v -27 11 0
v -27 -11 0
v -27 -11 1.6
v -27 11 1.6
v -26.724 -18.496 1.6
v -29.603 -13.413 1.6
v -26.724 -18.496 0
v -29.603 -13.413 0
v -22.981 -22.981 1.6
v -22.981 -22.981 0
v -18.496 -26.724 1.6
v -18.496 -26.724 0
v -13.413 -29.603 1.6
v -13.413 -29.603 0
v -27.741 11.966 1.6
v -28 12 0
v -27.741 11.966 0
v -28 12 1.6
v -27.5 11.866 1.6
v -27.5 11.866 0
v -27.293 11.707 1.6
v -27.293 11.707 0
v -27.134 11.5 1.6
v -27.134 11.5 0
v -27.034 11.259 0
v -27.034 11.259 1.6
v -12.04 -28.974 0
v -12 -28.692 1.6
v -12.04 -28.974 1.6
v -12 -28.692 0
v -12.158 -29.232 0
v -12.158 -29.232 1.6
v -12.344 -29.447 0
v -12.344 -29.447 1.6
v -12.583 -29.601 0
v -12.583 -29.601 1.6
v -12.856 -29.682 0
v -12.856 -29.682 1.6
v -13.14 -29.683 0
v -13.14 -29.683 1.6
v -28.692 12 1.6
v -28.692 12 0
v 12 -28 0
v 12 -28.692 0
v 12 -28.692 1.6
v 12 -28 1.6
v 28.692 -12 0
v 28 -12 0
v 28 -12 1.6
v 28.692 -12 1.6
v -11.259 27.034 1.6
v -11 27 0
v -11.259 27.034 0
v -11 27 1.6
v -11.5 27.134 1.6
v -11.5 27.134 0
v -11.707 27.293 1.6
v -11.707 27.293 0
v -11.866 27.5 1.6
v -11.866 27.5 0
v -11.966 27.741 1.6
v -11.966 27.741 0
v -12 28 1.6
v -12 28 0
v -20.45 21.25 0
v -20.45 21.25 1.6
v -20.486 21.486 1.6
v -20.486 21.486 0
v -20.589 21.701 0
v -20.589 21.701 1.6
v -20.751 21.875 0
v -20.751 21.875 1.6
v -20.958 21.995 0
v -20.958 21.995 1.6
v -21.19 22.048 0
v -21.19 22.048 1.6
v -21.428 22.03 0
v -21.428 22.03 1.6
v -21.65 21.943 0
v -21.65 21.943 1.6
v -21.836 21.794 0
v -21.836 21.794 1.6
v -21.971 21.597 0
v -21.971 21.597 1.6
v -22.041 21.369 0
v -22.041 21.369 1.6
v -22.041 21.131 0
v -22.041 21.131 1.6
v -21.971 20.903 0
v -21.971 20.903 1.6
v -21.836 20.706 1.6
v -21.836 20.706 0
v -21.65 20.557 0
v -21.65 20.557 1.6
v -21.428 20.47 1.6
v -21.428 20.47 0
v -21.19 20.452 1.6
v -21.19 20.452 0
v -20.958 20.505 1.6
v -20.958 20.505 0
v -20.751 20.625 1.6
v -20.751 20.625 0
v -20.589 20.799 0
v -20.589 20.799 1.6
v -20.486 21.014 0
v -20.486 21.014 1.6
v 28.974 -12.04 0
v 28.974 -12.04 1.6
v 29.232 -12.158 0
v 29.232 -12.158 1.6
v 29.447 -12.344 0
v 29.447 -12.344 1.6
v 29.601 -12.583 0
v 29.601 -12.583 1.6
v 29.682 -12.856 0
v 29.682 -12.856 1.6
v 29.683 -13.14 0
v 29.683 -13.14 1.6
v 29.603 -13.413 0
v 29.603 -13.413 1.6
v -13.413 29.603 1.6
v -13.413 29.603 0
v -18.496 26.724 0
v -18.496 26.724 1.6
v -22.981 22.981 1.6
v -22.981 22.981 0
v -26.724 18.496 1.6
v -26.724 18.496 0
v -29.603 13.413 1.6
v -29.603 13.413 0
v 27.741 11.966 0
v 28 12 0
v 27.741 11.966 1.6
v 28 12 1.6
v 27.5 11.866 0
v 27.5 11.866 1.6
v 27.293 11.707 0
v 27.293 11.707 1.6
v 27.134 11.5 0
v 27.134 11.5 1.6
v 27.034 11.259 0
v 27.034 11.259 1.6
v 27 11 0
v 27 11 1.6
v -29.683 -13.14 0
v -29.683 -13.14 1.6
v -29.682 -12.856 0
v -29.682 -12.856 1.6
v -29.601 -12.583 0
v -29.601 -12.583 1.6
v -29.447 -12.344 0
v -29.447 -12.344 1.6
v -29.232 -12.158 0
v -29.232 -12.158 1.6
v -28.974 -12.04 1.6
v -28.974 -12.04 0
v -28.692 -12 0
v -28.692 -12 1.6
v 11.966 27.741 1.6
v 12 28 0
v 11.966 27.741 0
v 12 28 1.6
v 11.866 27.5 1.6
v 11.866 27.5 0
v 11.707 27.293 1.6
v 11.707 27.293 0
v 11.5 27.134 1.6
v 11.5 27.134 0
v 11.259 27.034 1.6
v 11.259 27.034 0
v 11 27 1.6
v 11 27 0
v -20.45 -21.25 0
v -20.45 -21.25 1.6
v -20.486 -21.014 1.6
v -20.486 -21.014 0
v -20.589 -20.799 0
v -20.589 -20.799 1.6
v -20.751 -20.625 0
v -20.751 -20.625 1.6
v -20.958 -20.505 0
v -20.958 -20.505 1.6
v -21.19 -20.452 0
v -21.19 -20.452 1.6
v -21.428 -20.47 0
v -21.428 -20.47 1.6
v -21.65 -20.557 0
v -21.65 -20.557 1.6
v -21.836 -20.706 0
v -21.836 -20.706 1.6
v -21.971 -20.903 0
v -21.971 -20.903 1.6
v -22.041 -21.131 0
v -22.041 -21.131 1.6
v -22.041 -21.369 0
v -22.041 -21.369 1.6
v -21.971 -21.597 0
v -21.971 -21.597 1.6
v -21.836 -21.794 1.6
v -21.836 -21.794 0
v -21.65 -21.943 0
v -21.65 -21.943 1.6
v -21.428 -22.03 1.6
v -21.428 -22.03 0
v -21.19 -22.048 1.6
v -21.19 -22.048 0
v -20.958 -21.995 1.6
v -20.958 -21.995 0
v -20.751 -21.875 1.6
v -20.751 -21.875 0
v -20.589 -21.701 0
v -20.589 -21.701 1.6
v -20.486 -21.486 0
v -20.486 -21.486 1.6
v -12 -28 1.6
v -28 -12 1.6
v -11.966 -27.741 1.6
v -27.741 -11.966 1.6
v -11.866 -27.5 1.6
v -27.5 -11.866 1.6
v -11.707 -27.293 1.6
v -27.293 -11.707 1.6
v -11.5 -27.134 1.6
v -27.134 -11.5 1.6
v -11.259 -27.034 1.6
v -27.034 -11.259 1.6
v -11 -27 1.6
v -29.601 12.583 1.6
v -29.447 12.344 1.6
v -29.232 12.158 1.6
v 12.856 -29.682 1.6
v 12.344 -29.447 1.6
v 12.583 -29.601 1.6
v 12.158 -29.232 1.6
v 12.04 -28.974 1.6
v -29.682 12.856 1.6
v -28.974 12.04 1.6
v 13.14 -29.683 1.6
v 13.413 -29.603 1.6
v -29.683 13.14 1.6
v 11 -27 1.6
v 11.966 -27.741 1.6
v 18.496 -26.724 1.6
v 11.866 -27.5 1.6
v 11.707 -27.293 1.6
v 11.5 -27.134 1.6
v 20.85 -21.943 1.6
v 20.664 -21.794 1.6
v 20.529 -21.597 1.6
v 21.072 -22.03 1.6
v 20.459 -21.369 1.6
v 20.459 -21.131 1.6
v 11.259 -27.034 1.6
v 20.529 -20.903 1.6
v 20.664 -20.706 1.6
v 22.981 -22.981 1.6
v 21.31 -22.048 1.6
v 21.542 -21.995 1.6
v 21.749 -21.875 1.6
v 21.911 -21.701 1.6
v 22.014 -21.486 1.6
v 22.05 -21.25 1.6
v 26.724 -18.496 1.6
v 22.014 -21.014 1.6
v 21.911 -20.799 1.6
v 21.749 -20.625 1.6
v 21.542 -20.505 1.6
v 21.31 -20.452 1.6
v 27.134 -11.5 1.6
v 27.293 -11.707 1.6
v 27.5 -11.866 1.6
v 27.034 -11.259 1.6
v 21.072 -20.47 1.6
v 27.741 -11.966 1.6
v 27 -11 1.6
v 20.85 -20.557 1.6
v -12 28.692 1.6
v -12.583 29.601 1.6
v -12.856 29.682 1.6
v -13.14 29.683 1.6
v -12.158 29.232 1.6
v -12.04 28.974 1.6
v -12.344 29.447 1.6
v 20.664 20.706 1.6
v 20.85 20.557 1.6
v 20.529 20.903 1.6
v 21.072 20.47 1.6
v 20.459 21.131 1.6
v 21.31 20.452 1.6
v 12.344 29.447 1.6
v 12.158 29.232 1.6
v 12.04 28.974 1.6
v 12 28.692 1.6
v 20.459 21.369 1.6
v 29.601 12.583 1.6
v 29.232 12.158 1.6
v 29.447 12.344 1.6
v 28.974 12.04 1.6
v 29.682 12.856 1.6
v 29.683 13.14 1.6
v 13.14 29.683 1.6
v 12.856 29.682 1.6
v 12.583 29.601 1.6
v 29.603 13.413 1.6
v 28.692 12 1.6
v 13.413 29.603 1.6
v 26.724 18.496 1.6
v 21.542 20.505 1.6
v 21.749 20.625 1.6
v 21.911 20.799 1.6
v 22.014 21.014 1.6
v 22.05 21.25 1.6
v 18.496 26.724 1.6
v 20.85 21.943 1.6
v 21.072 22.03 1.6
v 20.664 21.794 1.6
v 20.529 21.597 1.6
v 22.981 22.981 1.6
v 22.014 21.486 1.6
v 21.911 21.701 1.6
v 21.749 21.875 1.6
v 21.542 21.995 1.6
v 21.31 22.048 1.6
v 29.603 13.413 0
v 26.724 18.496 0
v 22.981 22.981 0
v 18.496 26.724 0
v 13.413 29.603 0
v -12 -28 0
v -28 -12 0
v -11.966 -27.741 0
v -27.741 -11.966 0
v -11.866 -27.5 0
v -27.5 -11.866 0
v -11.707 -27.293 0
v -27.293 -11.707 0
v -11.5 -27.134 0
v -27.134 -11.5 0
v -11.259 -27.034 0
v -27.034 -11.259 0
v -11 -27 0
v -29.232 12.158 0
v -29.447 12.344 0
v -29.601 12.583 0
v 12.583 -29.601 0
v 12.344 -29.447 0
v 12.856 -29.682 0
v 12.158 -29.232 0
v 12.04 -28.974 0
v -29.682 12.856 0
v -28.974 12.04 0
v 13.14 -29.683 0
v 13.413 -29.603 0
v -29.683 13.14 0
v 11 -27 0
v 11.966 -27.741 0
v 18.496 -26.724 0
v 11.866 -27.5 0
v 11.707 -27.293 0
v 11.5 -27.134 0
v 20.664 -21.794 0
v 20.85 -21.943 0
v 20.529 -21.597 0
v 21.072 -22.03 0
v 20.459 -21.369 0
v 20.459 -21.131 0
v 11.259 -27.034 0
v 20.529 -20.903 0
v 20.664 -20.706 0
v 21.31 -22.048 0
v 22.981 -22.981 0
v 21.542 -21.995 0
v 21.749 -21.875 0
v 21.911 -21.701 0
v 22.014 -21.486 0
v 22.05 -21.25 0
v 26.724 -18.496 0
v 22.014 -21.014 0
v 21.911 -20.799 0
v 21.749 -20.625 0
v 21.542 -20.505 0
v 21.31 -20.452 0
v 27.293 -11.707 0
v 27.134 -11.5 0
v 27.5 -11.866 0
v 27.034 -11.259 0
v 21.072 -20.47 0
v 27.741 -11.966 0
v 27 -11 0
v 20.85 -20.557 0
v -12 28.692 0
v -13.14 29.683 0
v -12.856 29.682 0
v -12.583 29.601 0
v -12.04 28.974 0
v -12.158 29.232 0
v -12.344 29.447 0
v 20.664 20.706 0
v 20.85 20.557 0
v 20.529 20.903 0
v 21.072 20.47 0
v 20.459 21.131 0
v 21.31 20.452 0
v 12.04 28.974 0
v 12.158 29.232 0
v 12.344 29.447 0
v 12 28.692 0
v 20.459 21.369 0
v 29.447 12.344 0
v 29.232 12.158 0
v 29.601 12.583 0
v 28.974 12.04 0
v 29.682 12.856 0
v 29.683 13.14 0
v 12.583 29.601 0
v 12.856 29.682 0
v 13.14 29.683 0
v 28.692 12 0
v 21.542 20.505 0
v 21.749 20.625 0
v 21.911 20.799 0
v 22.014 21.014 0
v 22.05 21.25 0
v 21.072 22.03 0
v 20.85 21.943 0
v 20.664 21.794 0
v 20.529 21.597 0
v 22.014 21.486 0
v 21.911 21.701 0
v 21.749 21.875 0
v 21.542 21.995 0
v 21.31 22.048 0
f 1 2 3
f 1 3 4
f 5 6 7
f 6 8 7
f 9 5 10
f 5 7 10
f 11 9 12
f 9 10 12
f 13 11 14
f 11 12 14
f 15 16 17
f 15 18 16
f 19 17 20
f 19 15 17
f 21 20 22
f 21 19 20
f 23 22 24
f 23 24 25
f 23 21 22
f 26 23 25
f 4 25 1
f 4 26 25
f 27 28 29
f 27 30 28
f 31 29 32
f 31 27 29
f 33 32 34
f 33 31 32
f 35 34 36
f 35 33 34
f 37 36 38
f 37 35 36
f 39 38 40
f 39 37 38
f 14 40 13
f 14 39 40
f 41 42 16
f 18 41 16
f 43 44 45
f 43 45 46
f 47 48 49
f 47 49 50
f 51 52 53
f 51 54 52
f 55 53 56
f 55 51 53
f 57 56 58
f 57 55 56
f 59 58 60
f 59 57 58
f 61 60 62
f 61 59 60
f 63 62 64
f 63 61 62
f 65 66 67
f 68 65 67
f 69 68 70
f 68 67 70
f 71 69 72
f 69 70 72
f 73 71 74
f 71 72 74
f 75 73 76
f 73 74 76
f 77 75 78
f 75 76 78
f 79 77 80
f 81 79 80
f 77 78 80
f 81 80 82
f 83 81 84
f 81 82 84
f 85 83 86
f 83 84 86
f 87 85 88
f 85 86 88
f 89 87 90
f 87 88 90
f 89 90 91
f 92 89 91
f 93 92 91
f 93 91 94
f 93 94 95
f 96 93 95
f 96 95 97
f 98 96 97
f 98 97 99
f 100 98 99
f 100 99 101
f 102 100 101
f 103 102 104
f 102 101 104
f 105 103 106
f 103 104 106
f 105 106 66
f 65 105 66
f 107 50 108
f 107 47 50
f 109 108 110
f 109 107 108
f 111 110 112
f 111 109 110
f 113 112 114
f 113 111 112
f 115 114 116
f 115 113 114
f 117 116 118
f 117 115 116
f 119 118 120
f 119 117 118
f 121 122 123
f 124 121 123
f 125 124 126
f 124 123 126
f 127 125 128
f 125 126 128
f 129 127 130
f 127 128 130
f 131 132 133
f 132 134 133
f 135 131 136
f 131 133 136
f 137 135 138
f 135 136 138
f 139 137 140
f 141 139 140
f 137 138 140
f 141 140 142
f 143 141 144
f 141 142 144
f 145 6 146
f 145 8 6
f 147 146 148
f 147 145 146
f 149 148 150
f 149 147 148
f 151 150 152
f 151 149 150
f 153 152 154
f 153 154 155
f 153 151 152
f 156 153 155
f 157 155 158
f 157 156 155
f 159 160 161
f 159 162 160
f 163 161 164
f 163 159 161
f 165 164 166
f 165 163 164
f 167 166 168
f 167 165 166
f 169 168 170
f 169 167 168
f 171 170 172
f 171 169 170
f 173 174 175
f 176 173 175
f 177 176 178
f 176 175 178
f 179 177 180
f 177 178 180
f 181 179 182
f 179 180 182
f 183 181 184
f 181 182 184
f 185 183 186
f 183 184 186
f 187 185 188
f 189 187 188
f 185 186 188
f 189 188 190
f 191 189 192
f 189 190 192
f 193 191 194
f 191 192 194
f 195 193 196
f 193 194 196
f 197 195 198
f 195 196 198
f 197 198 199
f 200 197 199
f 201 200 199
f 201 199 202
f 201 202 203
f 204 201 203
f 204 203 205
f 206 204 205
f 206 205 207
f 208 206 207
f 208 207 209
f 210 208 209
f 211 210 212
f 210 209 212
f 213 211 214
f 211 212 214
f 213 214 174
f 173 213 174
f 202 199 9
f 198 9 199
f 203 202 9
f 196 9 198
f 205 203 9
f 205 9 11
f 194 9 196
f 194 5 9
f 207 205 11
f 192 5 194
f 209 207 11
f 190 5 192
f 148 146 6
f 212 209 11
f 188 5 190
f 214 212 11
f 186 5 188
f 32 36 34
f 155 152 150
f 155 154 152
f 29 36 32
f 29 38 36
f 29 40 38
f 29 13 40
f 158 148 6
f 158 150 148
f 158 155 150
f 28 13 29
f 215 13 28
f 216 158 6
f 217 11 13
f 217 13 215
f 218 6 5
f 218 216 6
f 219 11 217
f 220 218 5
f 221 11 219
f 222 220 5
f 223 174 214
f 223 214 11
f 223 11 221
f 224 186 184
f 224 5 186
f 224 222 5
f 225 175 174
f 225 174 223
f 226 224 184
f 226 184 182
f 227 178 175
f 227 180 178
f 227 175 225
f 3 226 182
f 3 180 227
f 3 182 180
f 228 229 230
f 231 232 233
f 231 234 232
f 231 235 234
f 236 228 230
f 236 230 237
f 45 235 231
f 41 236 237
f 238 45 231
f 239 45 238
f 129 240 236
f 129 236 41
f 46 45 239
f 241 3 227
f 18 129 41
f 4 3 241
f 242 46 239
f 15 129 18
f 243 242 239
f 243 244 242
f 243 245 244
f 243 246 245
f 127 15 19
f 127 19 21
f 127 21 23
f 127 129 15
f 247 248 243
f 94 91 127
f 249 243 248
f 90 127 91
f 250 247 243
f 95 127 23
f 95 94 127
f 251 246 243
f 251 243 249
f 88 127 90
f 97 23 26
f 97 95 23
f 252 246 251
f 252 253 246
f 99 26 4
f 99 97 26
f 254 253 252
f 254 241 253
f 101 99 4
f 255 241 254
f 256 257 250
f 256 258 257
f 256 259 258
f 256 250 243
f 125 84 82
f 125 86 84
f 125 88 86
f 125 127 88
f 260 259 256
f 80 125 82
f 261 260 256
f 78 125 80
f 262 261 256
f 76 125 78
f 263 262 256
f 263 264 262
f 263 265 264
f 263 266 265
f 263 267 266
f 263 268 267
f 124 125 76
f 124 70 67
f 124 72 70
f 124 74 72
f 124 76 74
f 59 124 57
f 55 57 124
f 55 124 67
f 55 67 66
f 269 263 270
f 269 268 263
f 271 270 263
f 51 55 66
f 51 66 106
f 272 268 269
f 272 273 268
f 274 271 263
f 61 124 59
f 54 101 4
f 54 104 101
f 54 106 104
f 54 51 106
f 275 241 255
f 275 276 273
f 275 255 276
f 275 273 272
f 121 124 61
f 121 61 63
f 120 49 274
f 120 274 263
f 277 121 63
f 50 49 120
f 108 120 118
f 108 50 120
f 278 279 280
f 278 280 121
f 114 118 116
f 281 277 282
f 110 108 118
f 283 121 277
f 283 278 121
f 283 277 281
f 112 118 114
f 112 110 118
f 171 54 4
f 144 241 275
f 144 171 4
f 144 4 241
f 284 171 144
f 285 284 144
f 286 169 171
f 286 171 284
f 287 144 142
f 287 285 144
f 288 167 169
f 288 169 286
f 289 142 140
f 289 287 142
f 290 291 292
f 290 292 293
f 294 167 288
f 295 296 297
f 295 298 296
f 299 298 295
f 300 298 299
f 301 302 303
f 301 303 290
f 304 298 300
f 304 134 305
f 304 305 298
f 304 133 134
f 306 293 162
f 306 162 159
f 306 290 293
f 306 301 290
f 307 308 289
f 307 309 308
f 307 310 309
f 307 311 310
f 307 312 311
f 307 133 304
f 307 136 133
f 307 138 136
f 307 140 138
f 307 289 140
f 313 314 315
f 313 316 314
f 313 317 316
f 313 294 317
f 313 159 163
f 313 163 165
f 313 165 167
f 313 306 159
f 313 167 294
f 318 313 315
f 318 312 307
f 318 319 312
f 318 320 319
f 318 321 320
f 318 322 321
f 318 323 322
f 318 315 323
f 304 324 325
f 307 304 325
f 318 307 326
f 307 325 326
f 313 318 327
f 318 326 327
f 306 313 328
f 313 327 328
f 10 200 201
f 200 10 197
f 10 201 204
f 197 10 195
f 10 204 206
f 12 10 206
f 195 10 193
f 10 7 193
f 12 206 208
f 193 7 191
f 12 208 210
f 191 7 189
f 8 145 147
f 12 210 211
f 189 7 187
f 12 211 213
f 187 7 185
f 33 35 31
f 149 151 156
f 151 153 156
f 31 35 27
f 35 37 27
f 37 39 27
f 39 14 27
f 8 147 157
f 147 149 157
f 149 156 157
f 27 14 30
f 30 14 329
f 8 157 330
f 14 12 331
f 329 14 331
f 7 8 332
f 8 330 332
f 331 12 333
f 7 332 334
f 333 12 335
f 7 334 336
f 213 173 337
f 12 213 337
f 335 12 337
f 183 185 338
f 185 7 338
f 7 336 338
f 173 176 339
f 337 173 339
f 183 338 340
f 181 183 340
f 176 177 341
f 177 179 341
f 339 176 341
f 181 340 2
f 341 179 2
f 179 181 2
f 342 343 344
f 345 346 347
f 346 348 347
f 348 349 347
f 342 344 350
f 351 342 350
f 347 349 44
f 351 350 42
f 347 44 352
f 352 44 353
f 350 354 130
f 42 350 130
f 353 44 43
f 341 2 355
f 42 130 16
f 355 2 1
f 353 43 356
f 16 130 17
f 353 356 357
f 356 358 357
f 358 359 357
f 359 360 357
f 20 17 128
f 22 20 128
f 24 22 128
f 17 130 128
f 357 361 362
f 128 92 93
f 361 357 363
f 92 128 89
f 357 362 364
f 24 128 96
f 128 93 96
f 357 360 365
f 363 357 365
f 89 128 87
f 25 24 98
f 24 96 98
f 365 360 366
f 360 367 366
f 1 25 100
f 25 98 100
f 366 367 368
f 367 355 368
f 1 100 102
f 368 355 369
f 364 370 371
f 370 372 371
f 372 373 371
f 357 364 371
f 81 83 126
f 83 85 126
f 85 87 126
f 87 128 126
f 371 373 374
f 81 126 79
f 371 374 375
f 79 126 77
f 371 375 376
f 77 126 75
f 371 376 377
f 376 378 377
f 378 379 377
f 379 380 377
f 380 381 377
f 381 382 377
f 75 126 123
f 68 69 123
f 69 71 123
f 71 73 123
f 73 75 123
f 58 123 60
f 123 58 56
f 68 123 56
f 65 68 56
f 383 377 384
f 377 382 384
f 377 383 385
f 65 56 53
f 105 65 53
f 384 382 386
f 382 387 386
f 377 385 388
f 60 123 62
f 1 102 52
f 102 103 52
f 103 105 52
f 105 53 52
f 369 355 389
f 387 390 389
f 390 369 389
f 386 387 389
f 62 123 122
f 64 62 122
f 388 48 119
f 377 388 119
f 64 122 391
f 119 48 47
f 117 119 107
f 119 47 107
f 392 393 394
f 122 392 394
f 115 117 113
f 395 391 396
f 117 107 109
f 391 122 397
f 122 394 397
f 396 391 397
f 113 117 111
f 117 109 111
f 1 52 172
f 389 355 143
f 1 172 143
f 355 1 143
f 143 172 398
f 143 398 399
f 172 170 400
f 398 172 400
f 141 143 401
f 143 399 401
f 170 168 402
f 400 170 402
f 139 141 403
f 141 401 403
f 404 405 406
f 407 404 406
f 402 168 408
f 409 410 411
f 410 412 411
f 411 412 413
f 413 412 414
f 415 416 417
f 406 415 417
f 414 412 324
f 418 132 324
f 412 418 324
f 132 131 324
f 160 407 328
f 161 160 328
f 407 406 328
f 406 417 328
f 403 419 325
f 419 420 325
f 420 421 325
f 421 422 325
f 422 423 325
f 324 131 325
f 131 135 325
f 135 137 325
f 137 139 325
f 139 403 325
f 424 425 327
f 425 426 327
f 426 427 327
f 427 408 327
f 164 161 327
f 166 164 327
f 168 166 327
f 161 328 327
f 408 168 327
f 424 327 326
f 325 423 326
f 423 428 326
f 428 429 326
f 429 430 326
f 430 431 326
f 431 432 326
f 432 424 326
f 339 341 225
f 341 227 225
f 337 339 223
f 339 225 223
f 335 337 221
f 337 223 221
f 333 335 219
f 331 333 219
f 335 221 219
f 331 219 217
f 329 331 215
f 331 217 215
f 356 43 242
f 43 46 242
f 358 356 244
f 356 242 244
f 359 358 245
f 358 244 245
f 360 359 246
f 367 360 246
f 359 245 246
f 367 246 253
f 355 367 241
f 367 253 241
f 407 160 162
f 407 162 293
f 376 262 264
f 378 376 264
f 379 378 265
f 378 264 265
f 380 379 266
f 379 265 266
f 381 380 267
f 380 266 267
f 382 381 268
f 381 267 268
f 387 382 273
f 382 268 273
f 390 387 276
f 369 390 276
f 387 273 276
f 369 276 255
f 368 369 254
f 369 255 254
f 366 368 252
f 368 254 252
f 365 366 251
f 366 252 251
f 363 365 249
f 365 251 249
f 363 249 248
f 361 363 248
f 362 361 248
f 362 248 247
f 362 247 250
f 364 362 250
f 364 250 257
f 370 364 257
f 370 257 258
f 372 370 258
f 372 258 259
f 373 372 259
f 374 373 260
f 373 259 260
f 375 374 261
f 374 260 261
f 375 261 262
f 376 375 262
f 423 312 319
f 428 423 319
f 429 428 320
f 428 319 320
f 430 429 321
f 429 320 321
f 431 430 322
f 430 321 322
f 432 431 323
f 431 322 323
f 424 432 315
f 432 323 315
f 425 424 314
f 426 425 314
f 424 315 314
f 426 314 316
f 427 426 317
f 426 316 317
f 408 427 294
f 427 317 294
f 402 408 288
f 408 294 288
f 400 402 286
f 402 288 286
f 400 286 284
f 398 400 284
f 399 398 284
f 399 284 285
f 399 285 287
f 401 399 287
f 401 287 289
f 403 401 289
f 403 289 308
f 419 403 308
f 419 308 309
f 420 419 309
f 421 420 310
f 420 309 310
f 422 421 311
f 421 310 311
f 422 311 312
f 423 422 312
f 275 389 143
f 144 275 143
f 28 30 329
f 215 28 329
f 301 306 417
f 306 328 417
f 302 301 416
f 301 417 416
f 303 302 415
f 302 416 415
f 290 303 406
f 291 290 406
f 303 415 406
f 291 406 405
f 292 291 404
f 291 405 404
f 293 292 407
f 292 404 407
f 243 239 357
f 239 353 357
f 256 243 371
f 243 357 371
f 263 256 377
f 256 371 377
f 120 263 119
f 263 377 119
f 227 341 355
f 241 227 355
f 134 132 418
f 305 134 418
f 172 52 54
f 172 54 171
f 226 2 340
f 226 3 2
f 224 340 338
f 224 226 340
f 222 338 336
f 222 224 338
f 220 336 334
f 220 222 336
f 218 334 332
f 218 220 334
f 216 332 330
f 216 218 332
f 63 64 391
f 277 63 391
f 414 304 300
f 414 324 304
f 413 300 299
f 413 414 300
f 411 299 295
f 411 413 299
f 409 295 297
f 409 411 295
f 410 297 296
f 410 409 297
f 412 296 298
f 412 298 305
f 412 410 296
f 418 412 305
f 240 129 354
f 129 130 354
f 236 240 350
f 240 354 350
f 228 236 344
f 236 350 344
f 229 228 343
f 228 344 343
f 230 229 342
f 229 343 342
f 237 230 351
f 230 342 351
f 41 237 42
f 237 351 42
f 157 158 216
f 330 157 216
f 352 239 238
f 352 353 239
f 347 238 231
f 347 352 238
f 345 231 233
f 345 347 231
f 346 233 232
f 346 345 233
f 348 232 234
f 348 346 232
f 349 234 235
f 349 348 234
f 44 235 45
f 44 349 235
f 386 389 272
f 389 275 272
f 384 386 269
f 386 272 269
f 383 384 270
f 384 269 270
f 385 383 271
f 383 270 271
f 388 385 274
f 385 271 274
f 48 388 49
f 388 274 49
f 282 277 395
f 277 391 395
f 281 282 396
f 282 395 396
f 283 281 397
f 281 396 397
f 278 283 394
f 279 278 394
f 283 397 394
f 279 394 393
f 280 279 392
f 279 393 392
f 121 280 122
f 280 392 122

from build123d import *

# Parameters (mm, degrees)
SKETCH_1_R          = 32.5
EXTRUDE_1_DEPTH     = 1.6
SKETCH_2_W          = 24
SKETCH_2_H          = 5.5
SKETCH_2_W_2        = 5.5
SKETCH_2_H_2        = 24
CUT_EXTRUDE_1_DEPTH = 1.6
SKETCH_3_R          = 0.8
CUT_EXTRUDE_2_DEPTH = 1.6
FILLET_1_R          = 1


with BuildPart() as part:
    # 草图1 → 凸台-拉伸1 (new body)
    with BuildSketch(Plane.XY):
        Circle(SKETCH_1_R)
    extrude(amount=EXTRUDE_1_DEPTH)

    # 草图2 → 切除-拉伸1 (cut)
    with BuildSketch(Plane.XY):
        with Locations((0, -29.75)):
            Rectangle(SKETCH_2_W, SKETCH_2_H)
        with Locations((29.75, 0)):
            Rectangle(SKETCH_2_W_2, SKETCH_2_H_2)
        with Locations((-29.75, 0)):
            Rectangle(SKETCH_2_W_2, SKETCH_2_H_2)
        with Locations((0, 29.75)):
            Rectangle(SKETCH_2_W, SKETCH_2_H)
    extrude(amount=CUT_EXTRUDE_1_DEPTH, mode=Mode.SUBTRACT)

    # 草图3 → 切除-拉伸2 (cut)
    with BuildSketch(Plane.XY.offset(1.6)):
        with Locations((21.25, 21.25)):
            Circle(SKETCH_3_R)
        with Locations((21.25, -21.25)):
            Circle(SKETCH_3_R)
        with Locations((-21.25, -21.25)):
            Circle(SKETCH_3_R)
        with Locations((-21.25, 21.25)):
            Circle(SKETCH_3_R)
    extrude(amount=-CUT_EXTRUDE_2_DEPTH, mode=Mode.SUBTRACT)

    # 圆角1
    fillet_1_edges = [part.edges().sort_by_distance(p)[0] for p in [
        (27, -12, 0.8),
        (27, 12, 0.8),
        (30.203476621, -12, 0.8),
        (30.203476621, 12, 0.8),
        (-12, -27, 0.8),
        (12, -30.203476621, 0.8),
        (12, -27, 0.8),
        (-12, -30.203476621, 0.8),
        (-27, 12, 0.8),
        (-30.203476621, -12, 0.8),
        (-27, -12, 0.8),
        (-30.203476621, 12, 0.8),
        (12, 27, 0.8),
        (-12, 30.203476621, 0.8),
        (-12, 27, 0.8),
        (12, 30.203476621, 0.8),
    ]]
    fillet(fillet_1_edges, radius=FILLET_1_R)


solid = part.part
